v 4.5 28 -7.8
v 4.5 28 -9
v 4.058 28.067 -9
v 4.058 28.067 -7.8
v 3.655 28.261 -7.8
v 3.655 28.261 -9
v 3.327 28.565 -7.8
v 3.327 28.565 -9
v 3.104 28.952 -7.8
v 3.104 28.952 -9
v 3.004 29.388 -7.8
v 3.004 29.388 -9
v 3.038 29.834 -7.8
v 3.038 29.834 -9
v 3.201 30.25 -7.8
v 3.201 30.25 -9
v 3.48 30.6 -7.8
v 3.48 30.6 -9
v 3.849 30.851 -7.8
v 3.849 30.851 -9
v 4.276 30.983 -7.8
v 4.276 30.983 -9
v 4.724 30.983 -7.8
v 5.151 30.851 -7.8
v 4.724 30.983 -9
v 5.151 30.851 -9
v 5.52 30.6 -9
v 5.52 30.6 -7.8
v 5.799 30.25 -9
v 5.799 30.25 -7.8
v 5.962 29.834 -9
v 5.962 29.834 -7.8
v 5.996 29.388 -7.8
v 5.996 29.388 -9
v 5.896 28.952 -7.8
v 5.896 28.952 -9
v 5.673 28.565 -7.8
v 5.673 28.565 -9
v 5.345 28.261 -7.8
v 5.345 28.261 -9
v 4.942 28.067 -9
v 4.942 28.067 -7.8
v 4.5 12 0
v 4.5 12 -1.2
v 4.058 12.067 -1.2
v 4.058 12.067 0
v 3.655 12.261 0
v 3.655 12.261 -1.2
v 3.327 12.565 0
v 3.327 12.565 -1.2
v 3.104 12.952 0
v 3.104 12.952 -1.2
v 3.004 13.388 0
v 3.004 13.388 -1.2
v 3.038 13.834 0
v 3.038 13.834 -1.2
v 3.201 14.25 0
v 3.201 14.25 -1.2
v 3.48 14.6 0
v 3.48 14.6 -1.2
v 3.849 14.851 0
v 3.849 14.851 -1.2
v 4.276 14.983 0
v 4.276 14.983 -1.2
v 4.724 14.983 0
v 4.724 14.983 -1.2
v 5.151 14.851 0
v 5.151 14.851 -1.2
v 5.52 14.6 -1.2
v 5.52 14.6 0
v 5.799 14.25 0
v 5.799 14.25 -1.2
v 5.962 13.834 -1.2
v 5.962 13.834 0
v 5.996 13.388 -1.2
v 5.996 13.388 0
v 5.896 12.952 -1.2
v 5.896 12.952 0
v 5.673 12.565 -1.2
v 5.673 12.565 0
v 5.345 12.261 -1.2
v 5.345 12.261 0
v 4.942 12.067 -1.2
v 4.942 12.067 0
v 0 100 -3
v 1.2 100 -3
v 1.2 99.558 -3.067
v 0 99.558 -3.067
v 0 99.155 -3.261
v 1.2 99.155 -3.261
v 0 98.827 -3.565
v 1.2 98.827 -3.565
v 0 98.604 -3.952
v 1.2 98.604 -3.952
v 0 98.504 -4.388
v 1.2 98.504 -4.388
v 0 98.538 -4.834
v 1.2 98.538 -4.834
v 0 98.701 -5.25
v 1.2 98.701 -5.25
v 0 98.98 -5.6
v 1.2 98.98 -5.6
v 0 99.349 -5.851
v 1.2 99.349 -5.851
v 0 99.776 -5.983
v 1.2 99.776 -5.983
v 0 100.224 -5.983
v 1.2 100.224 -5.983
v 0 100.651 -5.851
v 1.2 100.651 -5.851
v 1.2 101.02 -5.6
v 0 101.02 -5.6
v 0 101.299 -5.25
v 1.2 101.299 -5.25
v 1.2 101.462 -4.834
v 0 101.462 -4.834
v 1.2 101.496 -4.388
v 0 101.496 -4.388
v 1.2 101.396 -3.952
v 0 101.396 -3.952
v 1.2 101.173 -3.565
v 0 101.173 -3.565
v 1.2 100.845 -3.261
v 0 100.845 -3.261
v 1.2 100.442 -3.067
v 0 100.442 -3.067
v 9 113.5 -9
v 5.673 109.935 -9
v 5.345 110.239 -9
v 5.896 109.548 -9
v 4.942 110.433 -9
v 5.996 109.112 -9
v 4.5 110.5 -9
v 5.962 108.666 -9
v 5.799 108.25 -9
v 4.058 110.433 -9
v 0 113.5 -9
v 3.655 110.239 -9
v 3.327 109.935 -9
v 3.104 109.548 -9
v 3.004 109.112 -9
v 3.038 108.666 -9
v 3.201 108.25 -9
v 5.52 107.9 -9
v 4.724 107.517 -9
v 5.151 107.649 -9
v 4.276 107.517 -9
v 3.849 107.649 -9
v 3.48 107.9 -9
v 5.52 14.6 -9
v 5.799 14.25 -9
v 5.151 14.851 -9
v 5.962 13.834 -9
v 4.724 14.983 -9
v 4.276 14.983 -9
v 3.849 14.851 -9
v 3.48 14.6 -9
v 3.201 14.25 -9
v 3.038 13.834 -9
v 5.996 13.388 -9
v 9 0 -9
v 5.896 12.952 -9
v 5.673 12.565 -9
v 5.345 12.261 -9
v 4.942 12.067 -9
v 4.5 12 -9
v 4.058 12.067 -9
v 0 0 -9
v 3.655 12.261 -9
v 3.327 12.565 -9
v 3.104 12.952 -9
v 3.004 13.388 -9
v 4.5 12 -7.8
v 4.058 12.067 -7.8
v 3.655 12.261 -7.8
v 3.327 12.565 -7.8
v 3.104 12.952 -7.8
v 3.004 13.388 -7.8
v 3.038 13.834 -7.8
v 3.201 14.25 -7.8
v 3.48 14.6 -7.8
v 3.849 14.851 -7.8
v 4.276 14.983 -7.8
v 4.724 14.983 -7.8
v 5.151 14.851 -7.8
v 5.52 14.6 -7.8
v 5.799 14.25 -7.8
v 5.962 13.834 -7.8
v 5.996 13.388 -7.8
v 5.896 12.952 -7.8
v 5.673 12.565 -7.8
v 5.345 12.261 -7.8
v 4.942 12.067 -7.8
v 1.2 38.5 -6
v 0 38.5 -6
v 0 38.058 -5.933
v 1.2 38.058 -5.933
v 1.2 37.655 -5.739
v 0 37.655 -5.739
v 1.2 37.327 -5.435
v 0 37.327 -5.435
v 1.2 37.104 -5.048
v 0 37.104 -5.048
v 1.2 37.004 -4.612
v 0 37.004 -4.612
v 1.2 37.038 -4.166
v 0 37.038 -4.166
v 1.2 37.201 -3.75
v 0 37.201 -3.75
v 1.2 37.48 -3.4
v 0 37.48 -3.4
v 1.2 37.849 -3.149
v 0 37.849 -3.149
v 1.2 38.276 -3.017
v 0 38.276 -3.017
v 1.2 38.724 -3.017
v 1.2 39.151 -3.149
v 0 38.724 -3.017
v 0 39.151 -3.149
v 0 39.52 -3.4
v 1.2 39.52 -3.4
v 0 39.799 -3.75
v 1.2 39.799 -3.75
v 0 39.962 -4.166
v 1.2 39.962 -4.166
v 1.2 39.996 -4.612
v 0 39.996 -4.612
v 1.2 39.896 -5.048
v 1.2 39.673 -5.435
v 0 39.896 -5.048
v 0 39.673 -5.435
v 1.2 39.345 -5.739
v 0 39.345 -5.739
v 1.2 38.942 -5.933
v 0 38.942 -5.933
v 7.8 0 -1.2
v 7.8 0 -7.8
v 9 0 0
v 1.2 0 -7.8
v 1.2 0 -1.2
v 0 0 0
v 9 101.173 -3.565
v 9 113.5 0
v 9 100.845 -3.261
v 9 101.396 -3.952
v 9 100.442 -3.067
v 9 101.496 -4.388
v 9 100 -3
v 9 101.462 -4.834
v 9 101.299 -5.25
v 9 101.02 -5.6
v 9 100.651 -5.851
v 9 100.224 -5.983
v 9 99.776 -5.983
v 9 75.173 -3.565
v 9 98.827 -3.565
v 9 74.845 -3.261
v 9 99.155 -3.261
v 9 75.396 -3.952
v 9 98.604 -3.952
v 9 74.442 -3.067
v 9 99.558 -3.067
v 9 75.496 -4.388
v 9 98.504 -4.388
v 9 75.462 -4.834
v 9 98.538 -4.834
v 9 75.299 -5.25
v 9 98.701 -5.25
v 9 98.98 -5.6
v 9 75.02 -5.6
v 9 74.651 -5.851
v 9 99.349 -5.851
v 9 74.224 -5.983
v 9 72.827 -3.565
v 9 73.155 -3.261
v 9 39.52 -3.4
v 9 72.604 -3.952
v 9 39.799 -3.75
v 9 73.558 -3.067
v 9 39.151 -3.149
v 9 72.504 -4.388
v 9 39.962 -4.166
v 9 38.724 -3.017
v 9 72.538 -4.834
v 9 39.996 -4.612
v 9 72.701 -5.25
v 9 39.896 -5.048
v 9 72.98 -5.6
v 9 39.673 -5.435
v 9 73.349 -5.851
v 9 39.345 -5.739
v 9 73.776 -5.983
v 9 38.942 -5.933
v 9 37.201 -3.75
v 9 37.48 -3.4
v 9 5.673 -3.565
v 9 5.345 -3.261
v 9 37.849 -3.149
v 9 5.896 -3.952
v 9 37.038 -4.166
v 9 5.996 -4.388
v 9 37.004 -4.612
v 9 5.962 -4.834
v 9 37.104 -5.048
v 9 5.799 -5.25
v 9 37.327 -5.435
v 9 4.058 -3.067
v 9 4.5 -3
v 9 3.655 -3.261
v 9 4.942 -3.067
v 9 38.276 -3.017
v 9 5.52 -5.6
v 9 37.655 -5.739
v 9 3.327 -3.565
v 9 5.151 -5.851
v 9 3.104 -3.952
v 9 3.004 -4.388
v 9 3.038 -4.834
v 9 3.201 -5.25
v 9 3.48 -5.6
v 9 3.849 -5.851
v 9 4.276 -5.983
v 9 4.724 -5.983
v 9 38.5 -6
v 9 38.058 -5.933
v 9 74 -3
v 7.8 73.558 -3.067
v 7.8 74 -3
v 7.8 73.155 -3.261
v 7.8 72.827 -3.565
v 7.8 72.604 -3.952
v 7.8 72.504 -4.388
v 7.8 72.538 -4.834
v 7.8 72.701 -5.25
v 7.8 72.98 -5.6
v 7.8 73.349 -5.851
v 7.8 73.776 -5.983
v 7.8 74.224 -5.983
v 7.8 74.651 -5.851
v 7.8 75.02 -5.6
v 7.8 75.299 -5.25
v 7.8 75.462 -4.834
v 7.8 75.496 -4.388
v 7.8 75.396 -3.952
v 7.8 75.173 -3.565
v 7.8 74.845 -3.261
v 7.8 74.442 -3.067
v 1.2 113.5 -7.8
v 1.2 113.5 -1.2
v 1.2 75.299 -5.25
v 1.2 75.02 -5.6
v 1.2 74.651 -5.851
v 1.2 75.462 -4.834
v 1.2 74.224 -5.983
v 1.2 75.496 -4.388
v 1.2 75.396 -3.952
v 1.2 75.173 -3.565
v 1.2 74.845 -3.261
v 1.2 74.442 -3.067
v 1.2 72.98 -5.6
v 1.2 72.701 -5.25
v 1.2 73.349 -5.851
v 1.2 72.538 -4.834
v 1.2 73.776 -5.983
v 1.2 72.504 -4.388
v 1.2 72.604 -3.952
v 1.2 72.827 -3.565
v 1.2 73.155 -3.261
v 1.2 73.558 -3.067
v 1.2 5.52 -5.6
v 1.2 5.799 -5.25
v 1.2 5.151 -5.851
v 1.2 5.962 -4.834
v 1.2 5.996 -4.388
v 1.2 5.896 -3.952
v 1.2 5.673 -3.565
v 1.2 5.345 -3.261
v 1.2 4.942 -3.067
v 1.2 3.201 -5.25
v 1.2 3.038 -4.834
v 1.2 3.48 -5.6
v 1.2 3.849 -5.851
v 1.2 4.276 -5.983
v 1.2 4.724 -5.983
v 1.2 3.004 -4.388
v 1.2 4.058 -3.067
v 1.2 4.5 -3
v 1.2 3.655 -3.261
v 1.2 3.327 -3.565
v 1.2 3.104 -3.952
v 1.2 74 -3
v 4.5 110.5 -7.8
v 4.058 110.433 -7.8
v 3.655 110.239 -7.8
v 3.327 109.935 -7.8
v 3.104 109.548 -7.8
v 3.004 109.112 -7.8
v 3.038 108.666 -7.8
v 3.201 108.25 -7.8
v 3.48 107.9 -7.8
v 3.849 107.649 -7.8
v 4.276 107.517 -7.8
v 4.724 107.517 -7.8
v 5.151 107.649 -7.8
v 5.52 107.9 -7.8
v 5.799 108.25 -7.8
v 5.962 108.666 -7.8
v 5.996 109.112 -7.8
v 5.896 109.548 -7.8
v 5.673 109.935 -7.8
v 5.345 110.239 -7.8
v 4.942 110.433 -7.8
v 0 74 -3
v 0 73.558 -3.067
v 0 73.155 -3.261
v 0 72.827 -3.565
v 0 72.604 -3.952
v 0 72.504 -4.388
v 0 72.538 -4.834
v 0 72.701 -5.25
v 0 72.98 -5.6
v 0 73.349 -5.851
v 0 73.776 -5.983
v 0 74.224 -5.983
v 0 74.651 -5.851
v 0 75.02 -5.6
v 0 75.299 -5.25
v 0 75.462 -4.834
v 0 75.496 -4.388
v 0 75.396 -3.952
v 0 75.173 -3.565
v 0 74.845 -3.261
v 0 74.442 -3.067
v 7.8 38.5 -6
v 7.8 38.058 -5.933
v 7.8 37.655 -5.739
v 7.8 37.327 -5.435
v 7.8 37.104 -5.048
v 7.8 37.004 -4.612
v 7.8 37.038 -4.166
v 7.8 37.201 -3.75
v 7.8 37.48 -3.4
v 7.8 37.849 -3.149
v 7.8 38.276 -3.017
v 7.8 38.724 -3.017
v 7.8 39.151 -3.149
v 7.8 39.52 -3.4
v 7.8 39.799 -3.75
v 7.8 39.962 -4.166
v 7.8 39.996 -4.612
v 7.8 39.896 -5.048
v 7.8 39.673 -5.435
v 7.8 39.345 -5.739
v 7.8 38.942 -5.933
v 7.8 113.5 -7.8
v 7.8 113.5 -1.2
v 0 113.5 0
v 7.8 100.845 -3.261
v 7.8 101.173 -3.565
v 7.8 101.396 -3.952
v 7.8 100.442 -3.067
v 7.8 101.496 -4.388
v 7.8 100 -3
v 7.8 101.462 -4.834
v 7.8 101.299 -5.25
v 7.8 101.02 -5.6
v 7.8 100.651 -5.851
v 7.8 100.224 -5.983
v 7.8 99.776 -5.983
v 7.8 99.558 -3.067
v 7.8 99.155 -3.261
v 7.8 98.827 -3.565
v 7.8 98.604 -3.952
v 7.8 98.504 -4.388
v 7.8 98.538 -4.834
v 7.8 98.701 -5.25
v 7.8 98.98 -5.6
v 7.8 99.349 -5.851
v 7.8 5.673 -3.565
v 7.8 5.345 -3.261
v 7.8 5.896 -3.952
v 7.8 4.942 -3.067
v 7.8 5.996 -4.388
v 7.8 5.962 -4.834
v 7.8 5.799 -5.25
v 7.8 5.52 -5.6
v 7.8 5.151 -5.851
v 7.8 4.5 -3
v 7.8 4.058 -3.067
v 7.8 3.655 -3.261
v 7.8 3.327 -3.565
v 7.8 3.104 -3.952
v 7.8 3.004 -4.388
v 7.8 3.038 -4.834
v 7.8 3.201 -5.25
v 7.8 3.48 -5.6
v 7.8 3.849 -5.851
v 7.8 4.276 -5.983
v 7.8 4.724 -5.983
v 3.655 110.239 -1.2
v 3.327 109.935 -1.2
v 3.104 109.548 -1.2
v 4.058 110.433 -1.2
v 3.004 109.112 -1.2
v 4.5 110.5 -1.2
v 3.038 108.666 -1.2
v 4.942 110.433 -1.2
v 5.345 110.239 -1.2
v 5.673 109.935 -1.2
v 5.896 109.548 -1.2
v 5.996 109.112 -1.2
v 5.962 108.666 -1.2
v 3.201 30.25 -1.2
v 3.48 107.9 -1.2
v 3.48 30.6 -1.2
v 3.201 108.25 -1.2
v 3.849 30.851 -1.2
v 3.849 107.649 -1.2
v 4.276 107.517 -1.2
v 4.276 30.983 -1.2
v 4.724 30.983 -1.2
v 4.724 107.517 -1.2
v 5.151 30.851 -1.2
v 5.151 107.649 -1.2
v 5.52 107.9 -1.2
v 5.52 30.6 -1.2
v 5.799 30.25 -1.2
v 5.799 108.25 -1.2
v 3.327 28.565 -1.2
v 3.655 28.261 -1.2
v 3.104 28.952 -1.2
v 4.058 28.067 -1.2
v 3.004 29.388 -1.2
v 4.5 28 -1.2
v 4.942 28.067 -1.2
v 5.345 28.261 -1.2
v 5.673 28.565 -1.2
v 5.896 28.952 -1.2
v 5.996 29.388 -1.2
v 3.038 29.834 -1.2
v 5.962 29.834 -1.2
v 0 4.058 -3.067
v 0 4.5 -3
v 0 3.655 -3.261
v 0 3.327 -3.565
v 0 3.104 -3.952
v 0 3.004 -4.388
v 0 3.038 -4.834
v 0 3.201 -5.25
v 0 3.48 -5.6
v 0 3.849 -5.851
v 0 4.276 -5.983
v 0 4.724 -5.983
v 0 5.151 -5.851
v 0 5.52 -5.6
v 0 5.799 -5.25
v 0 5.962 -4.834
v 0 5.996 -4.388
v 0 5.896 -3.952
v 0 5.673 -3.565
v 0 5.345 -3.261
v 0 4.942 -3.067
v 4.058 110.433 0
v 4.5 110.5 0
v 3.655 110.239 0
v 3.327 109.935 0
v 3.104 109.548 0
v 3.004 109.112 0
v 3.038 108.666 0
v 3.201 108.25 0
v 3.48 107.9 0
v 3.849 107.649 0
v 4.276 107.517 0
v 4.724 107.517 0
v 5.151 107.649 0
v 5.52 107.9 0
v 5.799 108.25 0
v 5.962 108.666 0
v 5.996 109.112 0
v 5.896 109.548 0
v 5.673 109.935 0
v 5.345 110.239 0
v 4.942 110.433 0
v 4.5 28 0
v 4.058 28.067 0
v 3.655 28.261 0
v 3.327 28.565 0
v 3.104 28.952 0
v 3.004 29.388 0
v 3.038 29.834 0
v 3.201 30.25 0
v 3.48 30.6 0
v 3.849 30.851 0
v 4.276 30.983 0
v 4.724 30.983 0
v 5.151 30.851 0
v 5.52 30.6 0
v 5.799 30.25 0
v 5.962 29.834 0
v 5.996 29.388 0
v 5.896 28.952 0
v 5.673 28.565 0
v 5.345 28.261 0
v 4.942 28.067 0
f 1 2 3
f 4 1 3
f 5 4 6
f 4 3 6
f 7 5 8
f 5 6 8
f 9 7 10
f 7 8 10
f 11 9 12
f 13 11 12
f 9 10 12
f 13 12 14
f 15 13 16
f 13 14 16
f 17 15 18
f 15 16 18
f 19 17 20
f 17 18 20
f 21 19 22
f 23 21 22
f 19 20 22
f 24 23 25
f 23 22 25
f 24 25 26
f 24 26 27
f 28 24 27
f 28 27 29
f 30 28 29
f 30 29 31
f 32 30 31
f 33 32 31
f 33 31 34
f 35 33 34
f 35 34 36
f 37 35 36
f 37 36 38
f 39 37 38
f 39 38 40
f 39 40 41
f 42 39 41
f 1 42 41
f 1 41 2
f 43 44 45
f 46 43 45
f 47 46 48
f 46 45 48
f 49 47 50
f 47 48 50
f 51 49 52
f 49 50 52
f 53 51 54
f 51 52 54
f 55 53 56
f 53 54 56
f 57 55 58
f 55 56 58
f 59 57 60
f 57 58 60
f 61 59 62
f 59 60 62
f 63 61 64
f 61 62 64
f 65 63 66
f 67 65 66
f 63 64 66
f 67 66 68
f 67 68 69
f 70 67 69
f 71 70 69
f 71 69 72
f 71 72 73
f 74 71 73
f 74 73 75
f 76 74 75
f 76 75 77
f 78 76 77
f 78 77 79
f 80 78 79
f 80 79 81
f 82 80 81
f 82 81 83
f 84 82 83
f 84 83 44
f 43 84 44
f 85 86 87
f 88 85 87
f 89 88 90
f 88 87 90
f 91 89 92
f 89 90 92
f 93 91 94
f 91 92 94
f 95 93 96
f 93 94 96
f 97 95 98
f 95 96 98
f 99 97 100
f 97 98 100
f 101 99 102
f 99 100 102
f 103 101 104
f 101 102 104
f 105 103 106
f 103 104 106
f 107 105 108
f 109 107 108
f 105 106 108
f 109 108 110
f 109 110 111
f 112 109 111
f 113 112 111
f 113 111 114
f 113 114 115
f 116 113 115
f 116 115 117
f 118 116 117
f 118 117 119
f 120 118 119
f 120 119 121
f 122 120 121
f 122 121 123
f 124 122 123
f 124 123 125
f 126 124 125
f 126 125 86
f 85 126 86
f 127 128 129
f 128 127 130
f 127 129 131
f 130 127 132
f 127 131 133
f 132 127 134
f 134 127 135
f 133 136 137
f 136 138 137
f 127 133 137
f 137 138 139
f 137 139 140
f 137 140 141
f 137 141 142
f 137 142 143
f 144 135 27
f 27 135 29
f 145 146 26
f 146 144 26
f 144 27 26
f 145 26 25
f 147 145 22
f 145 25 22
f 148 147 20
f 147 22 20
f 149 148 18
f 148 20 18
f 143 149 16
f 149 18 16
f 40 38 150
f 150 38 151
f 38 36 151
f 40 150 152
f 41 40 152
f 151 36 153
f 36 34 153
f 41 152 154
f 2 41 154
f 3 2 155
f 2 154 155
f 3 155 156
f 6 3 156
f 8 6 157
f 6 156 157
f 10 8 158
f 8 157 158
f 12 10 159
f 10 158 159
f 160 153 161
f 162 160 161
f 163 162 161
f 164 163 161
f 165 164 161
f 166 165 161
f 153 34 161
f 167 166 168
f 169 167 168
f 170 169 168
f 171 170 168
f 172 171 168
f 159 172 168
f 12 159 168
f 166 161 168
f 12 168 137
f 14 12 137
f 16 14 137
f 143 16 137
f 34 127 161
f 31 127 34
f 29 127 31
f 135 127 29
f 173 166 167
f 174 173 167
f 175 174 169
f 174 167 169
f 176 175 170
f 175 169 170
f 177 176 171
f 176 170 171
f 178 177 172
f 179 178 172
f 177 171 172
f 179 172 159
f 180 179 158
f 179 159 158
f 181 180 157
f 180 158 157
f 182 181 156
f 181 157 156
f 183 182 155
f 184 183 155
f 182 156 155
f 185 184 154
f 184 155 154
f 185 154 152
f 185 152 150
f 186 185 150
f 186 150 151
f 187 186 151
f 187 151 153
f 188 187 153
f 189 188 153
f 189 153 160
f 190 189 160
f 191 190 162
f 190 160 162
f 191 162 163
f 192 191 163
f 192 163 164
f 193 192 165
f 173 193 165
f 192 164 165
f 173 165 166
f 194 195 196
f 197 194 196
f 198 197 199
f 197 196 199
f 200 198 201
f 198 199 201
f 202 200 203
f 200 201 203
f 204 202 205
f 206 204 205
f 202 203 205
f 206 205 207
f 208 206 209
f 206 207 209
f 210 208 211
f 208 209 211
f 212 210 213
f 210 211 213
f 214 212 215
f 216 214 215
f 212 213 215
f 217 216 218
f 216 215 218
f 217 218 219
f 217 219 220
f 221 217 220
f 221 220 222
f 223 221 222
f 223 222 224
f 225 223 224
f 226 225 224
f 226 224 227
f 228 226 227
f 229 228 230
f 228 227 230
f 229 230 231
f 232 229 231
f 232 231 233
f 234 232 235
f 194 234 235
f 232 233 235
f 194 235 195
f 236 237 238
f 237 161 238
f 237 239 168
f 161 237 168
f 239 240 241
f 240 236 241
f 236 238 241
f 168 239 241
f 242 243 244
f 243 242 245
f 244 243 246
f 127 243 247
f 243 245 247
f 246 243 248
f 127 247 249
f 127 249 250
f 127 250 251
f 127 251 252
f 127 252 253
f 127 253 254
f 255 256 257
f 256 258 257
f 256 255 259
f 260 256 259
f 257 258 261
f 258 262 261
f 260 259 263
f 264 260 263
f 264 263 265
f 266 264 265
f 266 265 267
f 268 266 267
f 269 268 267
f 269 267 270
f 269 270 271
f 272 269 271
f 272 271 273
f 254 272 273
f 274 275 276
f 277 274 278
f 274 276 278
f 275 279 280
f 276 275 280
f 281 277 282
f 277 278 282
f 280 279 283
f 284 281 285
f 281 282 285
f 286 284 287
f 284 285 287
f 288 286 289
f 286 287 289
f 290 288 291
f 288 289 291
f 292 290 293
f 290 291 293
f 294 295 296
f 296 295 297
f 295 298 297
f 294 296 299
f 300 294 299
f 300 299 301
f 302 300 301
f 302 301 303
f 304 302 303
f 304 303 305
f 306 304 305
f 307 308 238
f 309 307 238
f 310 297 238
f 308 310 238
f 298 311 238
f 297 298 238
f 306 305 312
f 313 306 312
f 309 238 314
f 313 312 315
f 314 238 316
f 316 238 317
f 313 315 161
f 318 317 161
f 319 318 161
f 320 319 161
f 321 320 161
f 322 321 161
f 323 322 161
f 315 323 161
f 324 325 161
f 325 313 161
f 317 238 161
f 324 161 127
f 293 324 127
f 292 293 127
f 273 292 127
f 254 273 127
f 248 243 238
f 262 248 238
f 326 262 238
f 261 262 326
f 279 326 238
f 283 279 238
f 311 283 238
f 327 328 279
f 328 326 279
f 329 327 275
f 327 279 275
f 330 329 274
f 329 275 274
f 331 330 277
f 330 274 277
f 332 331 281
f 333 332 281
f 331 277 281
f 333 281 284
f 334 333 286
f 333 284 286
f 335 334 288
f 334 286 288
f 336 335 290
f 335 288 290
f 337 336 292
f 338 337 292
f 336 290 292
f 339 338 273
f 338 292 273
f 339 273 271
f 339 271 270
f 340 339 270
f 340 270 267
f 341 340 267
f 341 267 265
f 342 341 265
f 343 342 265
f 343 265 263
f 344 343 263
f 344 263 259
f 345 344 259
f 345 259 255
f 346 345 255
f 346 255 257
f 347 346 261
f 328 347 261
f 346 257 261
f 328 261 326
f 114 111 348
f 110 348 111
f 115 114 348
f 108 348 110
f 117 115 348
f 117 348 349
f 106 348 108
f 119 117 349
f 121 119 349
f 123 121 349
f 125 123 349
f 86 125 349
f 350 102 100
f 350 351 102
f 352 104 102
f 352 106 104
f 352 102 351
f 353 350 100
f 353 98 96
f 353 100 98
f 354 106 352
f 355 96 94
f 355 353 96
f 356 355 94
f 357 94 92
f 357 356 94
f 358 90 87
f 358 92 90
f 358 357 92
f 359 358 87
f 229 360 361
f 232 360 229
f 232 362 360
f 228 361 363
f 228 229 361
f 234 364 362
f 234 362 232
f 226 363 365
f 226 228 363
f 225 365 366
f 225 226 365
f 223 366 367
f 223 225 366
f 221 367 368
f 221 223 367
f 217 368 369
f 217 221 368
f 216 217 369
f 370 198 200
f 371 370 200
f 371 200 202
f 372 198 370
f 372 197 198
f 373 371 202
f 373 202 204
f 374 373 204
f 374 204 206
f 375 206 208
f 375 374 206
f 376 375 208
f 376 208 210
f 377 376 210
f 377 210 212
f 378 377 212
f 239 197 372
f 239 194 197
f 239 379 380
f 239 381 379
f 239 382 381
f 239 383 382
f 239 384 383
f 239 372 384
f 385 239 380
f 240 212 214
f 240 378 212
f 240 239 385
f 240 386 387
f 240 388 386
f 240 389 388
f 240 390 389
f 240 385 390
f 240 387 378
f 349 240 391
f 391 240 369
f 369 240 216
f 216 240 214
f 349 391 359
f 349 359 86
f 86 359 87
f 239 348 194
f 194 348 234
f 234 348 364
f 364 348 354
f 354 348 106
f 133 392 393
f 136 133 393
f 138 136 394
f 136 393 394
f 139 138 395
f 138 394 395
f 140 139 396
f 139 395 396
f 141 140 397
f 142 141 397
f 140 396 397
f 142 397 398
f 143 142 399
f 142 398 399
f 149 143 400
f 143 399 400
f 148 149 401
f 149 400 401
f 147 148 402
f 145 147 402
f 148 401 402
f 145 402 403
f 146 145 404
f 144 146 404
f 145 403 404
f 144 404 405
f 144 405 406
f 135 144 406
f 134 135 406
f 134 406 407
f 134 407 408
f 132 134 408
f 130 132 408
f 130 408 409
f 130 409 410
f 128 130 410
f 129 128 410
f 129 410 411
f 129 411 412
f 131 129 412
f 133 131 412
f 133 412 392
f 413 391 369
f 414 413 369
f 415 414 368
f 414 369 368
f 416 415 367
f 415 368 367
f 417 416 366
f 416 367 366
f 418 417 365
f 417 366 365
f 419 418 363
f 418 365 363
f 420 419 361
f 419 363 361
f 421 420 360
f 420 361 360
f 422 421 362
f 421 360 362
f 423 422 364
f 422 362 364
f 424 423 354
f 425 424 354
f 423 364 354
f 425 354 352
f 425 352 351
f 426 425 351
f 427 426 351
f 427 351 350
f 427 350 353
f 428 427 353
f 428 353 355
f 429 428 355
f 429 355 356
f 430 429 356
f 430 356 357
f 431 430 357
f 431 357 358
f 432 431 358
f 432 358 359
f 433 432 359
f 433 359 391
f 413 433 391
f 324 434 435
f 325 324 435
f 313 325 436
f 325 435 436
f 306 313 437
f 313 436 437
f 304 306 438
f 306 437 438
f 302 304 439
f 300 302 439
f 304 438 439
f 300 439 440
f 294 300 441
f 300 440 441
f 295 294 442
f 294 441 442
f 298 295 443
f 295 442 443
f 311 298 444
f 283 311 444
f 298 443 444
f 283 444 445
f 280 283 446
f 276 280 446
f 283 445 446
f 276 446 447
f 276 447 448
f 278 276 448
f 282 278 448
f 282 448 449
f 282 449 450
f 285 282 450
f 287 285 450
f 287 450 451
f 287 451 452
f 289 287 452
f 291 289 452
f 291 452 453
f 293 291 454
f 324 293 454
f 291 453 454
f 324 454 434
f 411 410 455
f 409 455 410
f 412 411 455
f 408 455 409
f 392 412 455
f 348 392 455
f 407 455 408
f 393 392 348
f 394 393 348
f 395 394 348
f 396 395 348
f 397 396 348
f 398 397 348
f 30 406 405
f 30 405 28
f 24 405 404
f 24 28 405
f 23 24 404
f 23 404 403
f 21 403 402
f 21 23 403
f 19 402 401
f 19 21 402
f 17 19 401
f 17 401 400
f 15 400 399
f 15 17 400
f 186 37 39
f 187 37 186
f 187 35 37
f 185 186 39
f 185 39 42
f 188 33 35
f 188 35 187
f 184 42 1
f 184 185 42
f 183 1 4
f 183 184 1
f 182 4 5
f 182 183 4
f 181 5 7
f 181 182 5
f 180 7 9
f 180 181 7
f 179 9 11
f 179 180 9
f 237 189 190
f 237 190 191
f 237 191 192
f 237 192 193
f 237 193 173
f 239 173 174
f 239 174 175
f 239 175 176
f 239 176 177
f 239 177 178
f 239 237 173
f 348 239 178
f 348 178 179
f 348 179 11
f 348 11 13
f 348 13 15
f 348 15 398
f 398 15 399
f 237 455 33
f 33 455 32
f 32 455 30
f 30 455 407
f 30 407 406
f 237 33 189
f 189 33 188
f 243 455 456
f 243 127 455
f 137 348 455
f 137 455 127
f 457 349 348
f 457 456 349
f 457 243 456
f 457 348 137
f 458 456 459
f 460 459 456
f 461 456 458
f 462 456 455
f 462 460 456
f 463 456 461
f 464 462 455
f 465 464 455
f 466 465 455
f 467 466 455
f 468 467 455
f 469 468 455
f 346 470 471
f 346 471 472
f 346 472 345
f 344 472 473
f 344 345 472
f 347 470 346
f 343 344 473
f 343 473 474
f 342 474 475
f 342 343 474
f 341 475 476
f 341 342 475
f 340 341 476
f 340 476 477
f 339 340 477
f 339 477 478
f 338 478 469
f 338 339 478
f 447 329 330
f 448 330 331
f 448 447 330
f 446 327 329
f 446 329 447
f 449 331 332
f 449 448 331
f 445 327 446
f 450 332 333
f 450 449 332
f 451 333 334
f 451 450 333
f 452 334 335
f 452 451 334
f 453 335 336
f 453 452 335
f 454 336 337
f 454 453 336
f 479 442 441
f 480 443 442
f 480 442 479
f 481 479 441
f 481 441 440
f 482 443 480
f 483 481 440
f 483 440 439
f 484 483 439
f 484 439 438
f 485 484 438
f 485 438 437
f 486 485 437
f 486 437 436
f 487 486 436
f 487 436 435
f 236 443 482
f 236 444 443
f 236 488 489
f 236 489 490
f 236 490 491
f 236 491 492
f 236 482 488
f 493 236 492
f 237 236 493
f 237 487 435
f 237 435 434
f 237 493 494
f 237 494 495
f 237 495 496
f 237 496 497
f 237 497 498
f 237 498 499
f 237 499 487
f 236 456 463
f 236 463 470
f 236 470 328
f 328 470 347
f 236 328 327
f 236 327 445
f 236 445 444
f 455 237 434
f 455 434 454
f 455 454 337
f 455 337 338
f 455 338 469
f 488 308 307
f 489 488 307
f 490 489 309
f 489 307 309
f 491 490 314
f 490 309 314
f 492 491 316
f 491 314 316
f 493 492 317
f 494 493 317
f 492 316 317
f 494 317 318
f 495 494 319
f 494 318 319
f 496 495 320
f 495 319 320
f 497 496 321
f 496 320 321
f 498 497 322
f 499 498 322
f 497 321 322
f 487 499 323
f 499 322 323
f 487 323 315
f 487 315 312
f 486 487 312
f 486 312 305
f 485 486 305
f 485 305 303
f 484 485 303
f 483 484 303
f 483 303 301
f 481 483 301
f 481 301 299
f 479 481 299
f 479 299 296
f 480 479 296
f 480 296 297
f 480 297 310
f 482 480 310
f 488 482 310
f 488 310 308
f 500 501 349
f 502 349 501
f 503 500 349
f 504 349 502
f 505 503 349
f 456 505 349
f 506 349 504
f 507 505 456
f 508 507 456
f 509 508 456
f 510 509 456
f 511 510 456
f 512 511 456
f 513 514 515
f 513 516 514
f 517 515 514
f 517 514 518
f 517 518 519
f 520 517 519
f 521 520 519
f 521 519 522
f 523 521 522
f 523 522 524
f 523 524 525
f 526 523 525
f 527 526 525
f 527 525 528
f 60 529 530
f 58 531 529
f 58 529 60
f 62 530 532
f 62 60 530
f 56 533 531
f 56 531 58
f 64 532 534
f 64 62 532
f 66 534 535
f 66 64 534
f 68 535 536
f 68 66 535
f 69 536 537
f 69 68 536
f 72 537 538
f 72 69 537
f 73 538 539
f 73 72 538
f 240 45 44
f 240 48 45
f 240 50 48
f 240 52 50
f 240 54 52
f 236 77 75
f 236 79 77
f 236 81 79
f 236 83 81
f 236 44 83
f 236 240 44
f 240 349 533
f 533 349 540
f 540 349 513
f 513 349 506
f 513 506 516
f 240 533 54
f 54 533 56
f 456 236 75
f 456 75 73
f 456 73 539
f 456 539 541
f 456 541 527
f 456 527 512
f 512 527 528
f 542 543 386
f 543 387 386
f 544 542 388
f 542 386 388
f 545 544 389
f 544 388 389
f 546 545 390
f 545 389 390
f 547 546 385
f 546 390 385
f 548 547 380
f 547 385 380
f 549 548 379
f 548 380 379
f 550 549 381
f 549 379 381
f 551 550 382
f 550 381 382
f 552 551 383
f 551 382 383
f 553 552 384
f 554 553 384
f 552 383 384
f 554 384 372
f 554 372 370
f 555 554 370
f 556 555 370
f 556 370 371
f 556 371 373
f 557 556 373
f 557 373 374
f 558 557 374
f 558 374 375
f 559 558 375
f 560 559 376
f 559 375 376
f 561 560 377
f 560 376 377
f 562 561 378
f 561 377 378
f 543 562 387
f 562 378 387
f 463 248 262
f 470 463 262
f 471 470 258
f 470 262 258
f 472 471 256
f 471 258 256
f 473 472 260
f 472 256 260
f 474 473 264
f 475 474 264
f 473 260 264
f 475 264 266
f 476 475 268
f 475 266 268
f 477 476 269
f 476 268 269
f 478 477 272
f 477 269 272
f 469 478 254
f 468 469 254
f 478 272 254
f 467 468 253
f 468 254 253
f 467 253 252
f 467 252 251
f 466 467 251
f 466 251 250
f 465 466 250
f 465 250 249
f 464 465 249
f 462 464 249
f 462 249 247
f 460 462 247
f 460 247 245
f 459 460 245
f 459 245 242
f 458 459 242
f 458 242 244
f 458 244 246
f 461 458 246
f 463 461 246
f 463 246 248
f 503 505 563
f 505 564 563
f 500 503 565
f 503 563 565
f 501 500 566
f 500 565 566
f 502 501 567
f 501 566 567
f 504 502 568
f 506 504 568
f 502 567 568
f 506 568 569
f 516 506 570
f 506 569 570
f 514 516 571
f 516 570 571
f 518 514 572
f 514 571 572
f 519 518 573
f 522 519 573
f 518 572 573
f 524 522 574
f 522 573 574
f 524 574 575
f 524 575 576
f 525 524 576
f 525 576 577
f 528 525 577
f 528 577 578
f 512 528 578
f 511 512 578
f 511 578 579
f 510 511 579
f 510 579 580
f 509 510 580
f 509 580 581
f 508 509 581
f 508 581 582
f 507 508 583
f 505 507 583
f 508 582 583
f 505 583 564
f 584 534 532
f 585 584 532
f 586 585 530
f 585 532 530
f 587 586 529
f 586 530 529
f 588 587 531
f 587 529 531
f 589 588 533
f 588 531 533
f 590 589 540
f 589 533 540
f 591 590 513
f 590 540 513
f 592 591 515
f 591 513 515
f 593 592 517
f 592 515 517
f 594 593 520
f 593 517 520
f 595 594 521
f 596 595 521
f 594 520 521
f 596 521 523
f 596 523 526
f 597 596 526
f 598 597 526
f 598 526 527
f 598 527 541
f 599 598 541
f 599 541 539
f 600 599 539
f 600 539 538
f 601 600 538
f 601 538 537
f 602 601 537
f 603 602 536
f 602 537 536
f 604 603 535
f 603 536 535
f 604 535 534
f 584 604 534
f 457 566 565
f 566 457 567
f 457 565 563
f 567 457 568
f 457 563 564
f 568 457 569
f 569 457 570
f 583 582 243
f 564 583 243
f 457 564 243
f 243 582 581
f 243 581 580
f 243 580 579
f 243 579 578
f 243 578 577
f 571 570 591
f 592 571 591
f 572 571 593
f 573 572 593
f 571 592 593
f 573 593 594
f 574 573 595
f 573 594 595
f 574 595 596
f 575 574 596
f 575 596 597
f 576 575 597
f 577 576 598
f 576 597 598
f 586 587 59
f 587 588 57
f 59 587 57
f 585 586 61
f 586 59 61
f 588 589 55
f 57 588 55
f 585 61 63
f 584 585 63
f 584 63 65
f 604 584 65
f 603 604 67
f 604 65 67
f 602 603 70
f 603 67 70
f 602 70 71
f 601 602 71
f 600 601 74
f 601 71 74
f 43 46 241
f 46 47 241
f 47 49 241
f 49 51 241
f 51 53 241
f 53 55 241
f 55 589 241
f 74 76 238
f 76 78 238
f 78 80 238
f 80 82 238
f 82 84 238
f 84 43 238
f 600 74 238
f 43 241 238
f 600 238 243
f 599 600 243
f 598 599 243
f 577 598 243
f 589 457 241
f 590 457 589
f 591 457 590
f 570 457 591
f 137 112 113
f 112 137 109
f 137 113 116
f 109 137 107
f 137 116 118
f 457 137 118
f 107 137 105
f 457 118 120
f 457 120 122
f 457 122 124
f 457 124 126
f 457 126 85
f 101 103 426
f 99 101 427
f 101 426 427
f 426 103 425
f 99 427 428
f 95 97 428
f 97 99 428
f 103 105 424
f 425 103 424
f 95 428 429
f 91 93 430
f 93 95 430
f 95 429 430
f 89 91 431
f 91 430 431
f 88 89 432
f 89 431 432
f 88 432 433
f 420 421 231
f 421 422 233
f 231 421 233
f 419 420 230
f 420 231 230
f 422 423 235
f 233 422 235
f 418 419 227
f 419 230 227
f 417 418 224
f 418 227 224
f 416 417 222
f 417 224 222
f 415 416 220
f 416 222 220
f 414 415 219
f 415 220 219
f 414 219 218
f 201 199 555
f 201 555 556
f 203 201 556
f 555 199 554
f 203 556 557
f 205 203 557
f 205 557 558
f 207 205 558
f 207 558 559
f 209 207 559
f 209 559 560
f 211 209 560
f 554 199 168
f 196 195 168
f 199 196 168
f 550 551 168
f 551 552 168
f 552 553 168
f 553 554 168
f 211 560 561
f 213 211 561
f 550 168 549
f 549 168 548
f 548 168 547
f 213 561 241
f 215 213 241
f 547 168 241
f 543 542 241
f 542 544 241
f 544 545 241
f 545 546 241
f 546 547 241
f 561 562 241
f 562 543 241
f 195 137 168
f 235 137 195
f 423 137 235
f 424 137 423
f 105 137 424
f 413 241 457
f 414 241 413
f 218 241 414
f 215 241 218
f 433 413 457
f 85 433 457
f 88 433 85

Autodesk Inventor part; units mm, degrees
ref_plane "YZ Plane" through (0, 0, 0) normal (1, 0, 0) x (0, 1, 0)
ref_plane "XZ Plane" through (0, 0, 0) normal (0, 1, 0) x (-1, 0, 0)
ref_plane "XY Plane" through (0, 0, 0) normal (0, 0, 1) x (1, 0, 0)
sketch "スケッチ1" plane through (0, 0, 0) normal (0, 1, 0) x (-1, 0, 0)
  line L0 (0, 0) -> (-9, 0)
  line L1 (-9, 0) -> (-9, -9)
  line L2 (-9, -9) -> (0, -9)
  line L3 (0, -9) -> (0, 0)
  line L4 (-1.2, -1.2) -> (-7.8, -1.2)
  line L5 (-7.8, -1.2) -> (-7.8, -7.8)
  line L6 (-7.8, -7.8) -> (-1.2, -7.8)
  line L7 (-1.2, -7.8) -> (-1.2, -1.2)
  dimension "d0" = 9
  dimension "d1" = 9
  dimension "d2" = 6.6
  dimension "d3" = 6.6
  dimension "d4" = 1.2
  dimension "d5" = 1.2
extrude "押し出し1" add sketch "スケッチ1" along normal blind 113.5
sketch "スケッチ2" plane through (0, 0, 0) normal (0, 0, 1) x (1, 0, 0)
  line L0 (0, 0) -> (9, 0) projected
  line L1 (0, 0) -> (0, 113.5) projected
  point P0 (4.5, 29.5)
  point P1 (4.5, 13.5)
  dimension "d8" = 13.5
  dimension "d9" = 4.5
  dimension "d10" = 16
  dimension "d11" = 4.5
hole "穴1" at (4.5, 29.5, 0) at (4.5, 13.5, 0) direction (0, 0, -1) diameter 3 end through all
sketch "スケッチ3" plane through (0, 0, -9) normal (-1, 0, 0) x (0, 0, 1)
  line L0 (0, 0) -> (9, 0) projected
  line L1 (0, 0) -> (0, 113.5) projected
  point P0 (4.5, 4.5)
  point P1 (4.5, 74)
  dimension "d19" = 4.5
  dimension "d20" = 4.5
  dimension "d21" = 4.5
  dimension "d22" = 69.5
hole "穴2" at (0, 4.5, -4.5) at (0, 74, -4.5) direction (1, 0, 0) diameter 3 end through all
sketch "スケッチ4" plane through (0, 0, -9) normal (-1, 0, 0) x (0, 0, 1)
  line L0 (0, 113.5) -> (9, 113.5) projected
  line L1 (0, 0) -> (0, 113.5) projected
  point P0 (9, 0)
  point P1 (4.5, 100)
  dimension "d30" = 13.5
  dimension "d31" = 4.5
hole "穴3" at (0, 100, -4.5) direction (1, 0, 0) diameter 3 end through all
sketch "スケッチ5" plane through (9, 0, -9) normal (0, 0, -1) x (-1, 0, 0)
  line L0 (0, 113.5) -> (9, 113.5) projected
  line L1 (9, 0) -> (9, 113.5) projected
  point P0 (4.5, 109)
  dimension "d39" = 4.5
  dimension "d40" = 4.5
hole "穴4" at (4.5, 109, -9) direction (0, 0, 1) diameter 3 end through all
sketch "スケッチ6" plane through (9, 0, 0) normal (1, 0, 0) x (0, 0, -1)
  line L0 (0, 0) -> (0, 113.5) projected
  circle A0 centre (4.5, 4.5) radius 1.5 projected
  point P0 (4.5, 38.5)
  dimension "d48" = 4.5
  dimension "d49" = 34
hole "穴5" at (9, 38.5, -4.5) direction (-1, 0, 0) diameter 3 end through all
equation "\"d11\" = d9"
equation "\"d21\" = d19"
equation "\"d39\" = d40"
properties part number "上下直動9x9_2" material "アルミニウム 6061"
